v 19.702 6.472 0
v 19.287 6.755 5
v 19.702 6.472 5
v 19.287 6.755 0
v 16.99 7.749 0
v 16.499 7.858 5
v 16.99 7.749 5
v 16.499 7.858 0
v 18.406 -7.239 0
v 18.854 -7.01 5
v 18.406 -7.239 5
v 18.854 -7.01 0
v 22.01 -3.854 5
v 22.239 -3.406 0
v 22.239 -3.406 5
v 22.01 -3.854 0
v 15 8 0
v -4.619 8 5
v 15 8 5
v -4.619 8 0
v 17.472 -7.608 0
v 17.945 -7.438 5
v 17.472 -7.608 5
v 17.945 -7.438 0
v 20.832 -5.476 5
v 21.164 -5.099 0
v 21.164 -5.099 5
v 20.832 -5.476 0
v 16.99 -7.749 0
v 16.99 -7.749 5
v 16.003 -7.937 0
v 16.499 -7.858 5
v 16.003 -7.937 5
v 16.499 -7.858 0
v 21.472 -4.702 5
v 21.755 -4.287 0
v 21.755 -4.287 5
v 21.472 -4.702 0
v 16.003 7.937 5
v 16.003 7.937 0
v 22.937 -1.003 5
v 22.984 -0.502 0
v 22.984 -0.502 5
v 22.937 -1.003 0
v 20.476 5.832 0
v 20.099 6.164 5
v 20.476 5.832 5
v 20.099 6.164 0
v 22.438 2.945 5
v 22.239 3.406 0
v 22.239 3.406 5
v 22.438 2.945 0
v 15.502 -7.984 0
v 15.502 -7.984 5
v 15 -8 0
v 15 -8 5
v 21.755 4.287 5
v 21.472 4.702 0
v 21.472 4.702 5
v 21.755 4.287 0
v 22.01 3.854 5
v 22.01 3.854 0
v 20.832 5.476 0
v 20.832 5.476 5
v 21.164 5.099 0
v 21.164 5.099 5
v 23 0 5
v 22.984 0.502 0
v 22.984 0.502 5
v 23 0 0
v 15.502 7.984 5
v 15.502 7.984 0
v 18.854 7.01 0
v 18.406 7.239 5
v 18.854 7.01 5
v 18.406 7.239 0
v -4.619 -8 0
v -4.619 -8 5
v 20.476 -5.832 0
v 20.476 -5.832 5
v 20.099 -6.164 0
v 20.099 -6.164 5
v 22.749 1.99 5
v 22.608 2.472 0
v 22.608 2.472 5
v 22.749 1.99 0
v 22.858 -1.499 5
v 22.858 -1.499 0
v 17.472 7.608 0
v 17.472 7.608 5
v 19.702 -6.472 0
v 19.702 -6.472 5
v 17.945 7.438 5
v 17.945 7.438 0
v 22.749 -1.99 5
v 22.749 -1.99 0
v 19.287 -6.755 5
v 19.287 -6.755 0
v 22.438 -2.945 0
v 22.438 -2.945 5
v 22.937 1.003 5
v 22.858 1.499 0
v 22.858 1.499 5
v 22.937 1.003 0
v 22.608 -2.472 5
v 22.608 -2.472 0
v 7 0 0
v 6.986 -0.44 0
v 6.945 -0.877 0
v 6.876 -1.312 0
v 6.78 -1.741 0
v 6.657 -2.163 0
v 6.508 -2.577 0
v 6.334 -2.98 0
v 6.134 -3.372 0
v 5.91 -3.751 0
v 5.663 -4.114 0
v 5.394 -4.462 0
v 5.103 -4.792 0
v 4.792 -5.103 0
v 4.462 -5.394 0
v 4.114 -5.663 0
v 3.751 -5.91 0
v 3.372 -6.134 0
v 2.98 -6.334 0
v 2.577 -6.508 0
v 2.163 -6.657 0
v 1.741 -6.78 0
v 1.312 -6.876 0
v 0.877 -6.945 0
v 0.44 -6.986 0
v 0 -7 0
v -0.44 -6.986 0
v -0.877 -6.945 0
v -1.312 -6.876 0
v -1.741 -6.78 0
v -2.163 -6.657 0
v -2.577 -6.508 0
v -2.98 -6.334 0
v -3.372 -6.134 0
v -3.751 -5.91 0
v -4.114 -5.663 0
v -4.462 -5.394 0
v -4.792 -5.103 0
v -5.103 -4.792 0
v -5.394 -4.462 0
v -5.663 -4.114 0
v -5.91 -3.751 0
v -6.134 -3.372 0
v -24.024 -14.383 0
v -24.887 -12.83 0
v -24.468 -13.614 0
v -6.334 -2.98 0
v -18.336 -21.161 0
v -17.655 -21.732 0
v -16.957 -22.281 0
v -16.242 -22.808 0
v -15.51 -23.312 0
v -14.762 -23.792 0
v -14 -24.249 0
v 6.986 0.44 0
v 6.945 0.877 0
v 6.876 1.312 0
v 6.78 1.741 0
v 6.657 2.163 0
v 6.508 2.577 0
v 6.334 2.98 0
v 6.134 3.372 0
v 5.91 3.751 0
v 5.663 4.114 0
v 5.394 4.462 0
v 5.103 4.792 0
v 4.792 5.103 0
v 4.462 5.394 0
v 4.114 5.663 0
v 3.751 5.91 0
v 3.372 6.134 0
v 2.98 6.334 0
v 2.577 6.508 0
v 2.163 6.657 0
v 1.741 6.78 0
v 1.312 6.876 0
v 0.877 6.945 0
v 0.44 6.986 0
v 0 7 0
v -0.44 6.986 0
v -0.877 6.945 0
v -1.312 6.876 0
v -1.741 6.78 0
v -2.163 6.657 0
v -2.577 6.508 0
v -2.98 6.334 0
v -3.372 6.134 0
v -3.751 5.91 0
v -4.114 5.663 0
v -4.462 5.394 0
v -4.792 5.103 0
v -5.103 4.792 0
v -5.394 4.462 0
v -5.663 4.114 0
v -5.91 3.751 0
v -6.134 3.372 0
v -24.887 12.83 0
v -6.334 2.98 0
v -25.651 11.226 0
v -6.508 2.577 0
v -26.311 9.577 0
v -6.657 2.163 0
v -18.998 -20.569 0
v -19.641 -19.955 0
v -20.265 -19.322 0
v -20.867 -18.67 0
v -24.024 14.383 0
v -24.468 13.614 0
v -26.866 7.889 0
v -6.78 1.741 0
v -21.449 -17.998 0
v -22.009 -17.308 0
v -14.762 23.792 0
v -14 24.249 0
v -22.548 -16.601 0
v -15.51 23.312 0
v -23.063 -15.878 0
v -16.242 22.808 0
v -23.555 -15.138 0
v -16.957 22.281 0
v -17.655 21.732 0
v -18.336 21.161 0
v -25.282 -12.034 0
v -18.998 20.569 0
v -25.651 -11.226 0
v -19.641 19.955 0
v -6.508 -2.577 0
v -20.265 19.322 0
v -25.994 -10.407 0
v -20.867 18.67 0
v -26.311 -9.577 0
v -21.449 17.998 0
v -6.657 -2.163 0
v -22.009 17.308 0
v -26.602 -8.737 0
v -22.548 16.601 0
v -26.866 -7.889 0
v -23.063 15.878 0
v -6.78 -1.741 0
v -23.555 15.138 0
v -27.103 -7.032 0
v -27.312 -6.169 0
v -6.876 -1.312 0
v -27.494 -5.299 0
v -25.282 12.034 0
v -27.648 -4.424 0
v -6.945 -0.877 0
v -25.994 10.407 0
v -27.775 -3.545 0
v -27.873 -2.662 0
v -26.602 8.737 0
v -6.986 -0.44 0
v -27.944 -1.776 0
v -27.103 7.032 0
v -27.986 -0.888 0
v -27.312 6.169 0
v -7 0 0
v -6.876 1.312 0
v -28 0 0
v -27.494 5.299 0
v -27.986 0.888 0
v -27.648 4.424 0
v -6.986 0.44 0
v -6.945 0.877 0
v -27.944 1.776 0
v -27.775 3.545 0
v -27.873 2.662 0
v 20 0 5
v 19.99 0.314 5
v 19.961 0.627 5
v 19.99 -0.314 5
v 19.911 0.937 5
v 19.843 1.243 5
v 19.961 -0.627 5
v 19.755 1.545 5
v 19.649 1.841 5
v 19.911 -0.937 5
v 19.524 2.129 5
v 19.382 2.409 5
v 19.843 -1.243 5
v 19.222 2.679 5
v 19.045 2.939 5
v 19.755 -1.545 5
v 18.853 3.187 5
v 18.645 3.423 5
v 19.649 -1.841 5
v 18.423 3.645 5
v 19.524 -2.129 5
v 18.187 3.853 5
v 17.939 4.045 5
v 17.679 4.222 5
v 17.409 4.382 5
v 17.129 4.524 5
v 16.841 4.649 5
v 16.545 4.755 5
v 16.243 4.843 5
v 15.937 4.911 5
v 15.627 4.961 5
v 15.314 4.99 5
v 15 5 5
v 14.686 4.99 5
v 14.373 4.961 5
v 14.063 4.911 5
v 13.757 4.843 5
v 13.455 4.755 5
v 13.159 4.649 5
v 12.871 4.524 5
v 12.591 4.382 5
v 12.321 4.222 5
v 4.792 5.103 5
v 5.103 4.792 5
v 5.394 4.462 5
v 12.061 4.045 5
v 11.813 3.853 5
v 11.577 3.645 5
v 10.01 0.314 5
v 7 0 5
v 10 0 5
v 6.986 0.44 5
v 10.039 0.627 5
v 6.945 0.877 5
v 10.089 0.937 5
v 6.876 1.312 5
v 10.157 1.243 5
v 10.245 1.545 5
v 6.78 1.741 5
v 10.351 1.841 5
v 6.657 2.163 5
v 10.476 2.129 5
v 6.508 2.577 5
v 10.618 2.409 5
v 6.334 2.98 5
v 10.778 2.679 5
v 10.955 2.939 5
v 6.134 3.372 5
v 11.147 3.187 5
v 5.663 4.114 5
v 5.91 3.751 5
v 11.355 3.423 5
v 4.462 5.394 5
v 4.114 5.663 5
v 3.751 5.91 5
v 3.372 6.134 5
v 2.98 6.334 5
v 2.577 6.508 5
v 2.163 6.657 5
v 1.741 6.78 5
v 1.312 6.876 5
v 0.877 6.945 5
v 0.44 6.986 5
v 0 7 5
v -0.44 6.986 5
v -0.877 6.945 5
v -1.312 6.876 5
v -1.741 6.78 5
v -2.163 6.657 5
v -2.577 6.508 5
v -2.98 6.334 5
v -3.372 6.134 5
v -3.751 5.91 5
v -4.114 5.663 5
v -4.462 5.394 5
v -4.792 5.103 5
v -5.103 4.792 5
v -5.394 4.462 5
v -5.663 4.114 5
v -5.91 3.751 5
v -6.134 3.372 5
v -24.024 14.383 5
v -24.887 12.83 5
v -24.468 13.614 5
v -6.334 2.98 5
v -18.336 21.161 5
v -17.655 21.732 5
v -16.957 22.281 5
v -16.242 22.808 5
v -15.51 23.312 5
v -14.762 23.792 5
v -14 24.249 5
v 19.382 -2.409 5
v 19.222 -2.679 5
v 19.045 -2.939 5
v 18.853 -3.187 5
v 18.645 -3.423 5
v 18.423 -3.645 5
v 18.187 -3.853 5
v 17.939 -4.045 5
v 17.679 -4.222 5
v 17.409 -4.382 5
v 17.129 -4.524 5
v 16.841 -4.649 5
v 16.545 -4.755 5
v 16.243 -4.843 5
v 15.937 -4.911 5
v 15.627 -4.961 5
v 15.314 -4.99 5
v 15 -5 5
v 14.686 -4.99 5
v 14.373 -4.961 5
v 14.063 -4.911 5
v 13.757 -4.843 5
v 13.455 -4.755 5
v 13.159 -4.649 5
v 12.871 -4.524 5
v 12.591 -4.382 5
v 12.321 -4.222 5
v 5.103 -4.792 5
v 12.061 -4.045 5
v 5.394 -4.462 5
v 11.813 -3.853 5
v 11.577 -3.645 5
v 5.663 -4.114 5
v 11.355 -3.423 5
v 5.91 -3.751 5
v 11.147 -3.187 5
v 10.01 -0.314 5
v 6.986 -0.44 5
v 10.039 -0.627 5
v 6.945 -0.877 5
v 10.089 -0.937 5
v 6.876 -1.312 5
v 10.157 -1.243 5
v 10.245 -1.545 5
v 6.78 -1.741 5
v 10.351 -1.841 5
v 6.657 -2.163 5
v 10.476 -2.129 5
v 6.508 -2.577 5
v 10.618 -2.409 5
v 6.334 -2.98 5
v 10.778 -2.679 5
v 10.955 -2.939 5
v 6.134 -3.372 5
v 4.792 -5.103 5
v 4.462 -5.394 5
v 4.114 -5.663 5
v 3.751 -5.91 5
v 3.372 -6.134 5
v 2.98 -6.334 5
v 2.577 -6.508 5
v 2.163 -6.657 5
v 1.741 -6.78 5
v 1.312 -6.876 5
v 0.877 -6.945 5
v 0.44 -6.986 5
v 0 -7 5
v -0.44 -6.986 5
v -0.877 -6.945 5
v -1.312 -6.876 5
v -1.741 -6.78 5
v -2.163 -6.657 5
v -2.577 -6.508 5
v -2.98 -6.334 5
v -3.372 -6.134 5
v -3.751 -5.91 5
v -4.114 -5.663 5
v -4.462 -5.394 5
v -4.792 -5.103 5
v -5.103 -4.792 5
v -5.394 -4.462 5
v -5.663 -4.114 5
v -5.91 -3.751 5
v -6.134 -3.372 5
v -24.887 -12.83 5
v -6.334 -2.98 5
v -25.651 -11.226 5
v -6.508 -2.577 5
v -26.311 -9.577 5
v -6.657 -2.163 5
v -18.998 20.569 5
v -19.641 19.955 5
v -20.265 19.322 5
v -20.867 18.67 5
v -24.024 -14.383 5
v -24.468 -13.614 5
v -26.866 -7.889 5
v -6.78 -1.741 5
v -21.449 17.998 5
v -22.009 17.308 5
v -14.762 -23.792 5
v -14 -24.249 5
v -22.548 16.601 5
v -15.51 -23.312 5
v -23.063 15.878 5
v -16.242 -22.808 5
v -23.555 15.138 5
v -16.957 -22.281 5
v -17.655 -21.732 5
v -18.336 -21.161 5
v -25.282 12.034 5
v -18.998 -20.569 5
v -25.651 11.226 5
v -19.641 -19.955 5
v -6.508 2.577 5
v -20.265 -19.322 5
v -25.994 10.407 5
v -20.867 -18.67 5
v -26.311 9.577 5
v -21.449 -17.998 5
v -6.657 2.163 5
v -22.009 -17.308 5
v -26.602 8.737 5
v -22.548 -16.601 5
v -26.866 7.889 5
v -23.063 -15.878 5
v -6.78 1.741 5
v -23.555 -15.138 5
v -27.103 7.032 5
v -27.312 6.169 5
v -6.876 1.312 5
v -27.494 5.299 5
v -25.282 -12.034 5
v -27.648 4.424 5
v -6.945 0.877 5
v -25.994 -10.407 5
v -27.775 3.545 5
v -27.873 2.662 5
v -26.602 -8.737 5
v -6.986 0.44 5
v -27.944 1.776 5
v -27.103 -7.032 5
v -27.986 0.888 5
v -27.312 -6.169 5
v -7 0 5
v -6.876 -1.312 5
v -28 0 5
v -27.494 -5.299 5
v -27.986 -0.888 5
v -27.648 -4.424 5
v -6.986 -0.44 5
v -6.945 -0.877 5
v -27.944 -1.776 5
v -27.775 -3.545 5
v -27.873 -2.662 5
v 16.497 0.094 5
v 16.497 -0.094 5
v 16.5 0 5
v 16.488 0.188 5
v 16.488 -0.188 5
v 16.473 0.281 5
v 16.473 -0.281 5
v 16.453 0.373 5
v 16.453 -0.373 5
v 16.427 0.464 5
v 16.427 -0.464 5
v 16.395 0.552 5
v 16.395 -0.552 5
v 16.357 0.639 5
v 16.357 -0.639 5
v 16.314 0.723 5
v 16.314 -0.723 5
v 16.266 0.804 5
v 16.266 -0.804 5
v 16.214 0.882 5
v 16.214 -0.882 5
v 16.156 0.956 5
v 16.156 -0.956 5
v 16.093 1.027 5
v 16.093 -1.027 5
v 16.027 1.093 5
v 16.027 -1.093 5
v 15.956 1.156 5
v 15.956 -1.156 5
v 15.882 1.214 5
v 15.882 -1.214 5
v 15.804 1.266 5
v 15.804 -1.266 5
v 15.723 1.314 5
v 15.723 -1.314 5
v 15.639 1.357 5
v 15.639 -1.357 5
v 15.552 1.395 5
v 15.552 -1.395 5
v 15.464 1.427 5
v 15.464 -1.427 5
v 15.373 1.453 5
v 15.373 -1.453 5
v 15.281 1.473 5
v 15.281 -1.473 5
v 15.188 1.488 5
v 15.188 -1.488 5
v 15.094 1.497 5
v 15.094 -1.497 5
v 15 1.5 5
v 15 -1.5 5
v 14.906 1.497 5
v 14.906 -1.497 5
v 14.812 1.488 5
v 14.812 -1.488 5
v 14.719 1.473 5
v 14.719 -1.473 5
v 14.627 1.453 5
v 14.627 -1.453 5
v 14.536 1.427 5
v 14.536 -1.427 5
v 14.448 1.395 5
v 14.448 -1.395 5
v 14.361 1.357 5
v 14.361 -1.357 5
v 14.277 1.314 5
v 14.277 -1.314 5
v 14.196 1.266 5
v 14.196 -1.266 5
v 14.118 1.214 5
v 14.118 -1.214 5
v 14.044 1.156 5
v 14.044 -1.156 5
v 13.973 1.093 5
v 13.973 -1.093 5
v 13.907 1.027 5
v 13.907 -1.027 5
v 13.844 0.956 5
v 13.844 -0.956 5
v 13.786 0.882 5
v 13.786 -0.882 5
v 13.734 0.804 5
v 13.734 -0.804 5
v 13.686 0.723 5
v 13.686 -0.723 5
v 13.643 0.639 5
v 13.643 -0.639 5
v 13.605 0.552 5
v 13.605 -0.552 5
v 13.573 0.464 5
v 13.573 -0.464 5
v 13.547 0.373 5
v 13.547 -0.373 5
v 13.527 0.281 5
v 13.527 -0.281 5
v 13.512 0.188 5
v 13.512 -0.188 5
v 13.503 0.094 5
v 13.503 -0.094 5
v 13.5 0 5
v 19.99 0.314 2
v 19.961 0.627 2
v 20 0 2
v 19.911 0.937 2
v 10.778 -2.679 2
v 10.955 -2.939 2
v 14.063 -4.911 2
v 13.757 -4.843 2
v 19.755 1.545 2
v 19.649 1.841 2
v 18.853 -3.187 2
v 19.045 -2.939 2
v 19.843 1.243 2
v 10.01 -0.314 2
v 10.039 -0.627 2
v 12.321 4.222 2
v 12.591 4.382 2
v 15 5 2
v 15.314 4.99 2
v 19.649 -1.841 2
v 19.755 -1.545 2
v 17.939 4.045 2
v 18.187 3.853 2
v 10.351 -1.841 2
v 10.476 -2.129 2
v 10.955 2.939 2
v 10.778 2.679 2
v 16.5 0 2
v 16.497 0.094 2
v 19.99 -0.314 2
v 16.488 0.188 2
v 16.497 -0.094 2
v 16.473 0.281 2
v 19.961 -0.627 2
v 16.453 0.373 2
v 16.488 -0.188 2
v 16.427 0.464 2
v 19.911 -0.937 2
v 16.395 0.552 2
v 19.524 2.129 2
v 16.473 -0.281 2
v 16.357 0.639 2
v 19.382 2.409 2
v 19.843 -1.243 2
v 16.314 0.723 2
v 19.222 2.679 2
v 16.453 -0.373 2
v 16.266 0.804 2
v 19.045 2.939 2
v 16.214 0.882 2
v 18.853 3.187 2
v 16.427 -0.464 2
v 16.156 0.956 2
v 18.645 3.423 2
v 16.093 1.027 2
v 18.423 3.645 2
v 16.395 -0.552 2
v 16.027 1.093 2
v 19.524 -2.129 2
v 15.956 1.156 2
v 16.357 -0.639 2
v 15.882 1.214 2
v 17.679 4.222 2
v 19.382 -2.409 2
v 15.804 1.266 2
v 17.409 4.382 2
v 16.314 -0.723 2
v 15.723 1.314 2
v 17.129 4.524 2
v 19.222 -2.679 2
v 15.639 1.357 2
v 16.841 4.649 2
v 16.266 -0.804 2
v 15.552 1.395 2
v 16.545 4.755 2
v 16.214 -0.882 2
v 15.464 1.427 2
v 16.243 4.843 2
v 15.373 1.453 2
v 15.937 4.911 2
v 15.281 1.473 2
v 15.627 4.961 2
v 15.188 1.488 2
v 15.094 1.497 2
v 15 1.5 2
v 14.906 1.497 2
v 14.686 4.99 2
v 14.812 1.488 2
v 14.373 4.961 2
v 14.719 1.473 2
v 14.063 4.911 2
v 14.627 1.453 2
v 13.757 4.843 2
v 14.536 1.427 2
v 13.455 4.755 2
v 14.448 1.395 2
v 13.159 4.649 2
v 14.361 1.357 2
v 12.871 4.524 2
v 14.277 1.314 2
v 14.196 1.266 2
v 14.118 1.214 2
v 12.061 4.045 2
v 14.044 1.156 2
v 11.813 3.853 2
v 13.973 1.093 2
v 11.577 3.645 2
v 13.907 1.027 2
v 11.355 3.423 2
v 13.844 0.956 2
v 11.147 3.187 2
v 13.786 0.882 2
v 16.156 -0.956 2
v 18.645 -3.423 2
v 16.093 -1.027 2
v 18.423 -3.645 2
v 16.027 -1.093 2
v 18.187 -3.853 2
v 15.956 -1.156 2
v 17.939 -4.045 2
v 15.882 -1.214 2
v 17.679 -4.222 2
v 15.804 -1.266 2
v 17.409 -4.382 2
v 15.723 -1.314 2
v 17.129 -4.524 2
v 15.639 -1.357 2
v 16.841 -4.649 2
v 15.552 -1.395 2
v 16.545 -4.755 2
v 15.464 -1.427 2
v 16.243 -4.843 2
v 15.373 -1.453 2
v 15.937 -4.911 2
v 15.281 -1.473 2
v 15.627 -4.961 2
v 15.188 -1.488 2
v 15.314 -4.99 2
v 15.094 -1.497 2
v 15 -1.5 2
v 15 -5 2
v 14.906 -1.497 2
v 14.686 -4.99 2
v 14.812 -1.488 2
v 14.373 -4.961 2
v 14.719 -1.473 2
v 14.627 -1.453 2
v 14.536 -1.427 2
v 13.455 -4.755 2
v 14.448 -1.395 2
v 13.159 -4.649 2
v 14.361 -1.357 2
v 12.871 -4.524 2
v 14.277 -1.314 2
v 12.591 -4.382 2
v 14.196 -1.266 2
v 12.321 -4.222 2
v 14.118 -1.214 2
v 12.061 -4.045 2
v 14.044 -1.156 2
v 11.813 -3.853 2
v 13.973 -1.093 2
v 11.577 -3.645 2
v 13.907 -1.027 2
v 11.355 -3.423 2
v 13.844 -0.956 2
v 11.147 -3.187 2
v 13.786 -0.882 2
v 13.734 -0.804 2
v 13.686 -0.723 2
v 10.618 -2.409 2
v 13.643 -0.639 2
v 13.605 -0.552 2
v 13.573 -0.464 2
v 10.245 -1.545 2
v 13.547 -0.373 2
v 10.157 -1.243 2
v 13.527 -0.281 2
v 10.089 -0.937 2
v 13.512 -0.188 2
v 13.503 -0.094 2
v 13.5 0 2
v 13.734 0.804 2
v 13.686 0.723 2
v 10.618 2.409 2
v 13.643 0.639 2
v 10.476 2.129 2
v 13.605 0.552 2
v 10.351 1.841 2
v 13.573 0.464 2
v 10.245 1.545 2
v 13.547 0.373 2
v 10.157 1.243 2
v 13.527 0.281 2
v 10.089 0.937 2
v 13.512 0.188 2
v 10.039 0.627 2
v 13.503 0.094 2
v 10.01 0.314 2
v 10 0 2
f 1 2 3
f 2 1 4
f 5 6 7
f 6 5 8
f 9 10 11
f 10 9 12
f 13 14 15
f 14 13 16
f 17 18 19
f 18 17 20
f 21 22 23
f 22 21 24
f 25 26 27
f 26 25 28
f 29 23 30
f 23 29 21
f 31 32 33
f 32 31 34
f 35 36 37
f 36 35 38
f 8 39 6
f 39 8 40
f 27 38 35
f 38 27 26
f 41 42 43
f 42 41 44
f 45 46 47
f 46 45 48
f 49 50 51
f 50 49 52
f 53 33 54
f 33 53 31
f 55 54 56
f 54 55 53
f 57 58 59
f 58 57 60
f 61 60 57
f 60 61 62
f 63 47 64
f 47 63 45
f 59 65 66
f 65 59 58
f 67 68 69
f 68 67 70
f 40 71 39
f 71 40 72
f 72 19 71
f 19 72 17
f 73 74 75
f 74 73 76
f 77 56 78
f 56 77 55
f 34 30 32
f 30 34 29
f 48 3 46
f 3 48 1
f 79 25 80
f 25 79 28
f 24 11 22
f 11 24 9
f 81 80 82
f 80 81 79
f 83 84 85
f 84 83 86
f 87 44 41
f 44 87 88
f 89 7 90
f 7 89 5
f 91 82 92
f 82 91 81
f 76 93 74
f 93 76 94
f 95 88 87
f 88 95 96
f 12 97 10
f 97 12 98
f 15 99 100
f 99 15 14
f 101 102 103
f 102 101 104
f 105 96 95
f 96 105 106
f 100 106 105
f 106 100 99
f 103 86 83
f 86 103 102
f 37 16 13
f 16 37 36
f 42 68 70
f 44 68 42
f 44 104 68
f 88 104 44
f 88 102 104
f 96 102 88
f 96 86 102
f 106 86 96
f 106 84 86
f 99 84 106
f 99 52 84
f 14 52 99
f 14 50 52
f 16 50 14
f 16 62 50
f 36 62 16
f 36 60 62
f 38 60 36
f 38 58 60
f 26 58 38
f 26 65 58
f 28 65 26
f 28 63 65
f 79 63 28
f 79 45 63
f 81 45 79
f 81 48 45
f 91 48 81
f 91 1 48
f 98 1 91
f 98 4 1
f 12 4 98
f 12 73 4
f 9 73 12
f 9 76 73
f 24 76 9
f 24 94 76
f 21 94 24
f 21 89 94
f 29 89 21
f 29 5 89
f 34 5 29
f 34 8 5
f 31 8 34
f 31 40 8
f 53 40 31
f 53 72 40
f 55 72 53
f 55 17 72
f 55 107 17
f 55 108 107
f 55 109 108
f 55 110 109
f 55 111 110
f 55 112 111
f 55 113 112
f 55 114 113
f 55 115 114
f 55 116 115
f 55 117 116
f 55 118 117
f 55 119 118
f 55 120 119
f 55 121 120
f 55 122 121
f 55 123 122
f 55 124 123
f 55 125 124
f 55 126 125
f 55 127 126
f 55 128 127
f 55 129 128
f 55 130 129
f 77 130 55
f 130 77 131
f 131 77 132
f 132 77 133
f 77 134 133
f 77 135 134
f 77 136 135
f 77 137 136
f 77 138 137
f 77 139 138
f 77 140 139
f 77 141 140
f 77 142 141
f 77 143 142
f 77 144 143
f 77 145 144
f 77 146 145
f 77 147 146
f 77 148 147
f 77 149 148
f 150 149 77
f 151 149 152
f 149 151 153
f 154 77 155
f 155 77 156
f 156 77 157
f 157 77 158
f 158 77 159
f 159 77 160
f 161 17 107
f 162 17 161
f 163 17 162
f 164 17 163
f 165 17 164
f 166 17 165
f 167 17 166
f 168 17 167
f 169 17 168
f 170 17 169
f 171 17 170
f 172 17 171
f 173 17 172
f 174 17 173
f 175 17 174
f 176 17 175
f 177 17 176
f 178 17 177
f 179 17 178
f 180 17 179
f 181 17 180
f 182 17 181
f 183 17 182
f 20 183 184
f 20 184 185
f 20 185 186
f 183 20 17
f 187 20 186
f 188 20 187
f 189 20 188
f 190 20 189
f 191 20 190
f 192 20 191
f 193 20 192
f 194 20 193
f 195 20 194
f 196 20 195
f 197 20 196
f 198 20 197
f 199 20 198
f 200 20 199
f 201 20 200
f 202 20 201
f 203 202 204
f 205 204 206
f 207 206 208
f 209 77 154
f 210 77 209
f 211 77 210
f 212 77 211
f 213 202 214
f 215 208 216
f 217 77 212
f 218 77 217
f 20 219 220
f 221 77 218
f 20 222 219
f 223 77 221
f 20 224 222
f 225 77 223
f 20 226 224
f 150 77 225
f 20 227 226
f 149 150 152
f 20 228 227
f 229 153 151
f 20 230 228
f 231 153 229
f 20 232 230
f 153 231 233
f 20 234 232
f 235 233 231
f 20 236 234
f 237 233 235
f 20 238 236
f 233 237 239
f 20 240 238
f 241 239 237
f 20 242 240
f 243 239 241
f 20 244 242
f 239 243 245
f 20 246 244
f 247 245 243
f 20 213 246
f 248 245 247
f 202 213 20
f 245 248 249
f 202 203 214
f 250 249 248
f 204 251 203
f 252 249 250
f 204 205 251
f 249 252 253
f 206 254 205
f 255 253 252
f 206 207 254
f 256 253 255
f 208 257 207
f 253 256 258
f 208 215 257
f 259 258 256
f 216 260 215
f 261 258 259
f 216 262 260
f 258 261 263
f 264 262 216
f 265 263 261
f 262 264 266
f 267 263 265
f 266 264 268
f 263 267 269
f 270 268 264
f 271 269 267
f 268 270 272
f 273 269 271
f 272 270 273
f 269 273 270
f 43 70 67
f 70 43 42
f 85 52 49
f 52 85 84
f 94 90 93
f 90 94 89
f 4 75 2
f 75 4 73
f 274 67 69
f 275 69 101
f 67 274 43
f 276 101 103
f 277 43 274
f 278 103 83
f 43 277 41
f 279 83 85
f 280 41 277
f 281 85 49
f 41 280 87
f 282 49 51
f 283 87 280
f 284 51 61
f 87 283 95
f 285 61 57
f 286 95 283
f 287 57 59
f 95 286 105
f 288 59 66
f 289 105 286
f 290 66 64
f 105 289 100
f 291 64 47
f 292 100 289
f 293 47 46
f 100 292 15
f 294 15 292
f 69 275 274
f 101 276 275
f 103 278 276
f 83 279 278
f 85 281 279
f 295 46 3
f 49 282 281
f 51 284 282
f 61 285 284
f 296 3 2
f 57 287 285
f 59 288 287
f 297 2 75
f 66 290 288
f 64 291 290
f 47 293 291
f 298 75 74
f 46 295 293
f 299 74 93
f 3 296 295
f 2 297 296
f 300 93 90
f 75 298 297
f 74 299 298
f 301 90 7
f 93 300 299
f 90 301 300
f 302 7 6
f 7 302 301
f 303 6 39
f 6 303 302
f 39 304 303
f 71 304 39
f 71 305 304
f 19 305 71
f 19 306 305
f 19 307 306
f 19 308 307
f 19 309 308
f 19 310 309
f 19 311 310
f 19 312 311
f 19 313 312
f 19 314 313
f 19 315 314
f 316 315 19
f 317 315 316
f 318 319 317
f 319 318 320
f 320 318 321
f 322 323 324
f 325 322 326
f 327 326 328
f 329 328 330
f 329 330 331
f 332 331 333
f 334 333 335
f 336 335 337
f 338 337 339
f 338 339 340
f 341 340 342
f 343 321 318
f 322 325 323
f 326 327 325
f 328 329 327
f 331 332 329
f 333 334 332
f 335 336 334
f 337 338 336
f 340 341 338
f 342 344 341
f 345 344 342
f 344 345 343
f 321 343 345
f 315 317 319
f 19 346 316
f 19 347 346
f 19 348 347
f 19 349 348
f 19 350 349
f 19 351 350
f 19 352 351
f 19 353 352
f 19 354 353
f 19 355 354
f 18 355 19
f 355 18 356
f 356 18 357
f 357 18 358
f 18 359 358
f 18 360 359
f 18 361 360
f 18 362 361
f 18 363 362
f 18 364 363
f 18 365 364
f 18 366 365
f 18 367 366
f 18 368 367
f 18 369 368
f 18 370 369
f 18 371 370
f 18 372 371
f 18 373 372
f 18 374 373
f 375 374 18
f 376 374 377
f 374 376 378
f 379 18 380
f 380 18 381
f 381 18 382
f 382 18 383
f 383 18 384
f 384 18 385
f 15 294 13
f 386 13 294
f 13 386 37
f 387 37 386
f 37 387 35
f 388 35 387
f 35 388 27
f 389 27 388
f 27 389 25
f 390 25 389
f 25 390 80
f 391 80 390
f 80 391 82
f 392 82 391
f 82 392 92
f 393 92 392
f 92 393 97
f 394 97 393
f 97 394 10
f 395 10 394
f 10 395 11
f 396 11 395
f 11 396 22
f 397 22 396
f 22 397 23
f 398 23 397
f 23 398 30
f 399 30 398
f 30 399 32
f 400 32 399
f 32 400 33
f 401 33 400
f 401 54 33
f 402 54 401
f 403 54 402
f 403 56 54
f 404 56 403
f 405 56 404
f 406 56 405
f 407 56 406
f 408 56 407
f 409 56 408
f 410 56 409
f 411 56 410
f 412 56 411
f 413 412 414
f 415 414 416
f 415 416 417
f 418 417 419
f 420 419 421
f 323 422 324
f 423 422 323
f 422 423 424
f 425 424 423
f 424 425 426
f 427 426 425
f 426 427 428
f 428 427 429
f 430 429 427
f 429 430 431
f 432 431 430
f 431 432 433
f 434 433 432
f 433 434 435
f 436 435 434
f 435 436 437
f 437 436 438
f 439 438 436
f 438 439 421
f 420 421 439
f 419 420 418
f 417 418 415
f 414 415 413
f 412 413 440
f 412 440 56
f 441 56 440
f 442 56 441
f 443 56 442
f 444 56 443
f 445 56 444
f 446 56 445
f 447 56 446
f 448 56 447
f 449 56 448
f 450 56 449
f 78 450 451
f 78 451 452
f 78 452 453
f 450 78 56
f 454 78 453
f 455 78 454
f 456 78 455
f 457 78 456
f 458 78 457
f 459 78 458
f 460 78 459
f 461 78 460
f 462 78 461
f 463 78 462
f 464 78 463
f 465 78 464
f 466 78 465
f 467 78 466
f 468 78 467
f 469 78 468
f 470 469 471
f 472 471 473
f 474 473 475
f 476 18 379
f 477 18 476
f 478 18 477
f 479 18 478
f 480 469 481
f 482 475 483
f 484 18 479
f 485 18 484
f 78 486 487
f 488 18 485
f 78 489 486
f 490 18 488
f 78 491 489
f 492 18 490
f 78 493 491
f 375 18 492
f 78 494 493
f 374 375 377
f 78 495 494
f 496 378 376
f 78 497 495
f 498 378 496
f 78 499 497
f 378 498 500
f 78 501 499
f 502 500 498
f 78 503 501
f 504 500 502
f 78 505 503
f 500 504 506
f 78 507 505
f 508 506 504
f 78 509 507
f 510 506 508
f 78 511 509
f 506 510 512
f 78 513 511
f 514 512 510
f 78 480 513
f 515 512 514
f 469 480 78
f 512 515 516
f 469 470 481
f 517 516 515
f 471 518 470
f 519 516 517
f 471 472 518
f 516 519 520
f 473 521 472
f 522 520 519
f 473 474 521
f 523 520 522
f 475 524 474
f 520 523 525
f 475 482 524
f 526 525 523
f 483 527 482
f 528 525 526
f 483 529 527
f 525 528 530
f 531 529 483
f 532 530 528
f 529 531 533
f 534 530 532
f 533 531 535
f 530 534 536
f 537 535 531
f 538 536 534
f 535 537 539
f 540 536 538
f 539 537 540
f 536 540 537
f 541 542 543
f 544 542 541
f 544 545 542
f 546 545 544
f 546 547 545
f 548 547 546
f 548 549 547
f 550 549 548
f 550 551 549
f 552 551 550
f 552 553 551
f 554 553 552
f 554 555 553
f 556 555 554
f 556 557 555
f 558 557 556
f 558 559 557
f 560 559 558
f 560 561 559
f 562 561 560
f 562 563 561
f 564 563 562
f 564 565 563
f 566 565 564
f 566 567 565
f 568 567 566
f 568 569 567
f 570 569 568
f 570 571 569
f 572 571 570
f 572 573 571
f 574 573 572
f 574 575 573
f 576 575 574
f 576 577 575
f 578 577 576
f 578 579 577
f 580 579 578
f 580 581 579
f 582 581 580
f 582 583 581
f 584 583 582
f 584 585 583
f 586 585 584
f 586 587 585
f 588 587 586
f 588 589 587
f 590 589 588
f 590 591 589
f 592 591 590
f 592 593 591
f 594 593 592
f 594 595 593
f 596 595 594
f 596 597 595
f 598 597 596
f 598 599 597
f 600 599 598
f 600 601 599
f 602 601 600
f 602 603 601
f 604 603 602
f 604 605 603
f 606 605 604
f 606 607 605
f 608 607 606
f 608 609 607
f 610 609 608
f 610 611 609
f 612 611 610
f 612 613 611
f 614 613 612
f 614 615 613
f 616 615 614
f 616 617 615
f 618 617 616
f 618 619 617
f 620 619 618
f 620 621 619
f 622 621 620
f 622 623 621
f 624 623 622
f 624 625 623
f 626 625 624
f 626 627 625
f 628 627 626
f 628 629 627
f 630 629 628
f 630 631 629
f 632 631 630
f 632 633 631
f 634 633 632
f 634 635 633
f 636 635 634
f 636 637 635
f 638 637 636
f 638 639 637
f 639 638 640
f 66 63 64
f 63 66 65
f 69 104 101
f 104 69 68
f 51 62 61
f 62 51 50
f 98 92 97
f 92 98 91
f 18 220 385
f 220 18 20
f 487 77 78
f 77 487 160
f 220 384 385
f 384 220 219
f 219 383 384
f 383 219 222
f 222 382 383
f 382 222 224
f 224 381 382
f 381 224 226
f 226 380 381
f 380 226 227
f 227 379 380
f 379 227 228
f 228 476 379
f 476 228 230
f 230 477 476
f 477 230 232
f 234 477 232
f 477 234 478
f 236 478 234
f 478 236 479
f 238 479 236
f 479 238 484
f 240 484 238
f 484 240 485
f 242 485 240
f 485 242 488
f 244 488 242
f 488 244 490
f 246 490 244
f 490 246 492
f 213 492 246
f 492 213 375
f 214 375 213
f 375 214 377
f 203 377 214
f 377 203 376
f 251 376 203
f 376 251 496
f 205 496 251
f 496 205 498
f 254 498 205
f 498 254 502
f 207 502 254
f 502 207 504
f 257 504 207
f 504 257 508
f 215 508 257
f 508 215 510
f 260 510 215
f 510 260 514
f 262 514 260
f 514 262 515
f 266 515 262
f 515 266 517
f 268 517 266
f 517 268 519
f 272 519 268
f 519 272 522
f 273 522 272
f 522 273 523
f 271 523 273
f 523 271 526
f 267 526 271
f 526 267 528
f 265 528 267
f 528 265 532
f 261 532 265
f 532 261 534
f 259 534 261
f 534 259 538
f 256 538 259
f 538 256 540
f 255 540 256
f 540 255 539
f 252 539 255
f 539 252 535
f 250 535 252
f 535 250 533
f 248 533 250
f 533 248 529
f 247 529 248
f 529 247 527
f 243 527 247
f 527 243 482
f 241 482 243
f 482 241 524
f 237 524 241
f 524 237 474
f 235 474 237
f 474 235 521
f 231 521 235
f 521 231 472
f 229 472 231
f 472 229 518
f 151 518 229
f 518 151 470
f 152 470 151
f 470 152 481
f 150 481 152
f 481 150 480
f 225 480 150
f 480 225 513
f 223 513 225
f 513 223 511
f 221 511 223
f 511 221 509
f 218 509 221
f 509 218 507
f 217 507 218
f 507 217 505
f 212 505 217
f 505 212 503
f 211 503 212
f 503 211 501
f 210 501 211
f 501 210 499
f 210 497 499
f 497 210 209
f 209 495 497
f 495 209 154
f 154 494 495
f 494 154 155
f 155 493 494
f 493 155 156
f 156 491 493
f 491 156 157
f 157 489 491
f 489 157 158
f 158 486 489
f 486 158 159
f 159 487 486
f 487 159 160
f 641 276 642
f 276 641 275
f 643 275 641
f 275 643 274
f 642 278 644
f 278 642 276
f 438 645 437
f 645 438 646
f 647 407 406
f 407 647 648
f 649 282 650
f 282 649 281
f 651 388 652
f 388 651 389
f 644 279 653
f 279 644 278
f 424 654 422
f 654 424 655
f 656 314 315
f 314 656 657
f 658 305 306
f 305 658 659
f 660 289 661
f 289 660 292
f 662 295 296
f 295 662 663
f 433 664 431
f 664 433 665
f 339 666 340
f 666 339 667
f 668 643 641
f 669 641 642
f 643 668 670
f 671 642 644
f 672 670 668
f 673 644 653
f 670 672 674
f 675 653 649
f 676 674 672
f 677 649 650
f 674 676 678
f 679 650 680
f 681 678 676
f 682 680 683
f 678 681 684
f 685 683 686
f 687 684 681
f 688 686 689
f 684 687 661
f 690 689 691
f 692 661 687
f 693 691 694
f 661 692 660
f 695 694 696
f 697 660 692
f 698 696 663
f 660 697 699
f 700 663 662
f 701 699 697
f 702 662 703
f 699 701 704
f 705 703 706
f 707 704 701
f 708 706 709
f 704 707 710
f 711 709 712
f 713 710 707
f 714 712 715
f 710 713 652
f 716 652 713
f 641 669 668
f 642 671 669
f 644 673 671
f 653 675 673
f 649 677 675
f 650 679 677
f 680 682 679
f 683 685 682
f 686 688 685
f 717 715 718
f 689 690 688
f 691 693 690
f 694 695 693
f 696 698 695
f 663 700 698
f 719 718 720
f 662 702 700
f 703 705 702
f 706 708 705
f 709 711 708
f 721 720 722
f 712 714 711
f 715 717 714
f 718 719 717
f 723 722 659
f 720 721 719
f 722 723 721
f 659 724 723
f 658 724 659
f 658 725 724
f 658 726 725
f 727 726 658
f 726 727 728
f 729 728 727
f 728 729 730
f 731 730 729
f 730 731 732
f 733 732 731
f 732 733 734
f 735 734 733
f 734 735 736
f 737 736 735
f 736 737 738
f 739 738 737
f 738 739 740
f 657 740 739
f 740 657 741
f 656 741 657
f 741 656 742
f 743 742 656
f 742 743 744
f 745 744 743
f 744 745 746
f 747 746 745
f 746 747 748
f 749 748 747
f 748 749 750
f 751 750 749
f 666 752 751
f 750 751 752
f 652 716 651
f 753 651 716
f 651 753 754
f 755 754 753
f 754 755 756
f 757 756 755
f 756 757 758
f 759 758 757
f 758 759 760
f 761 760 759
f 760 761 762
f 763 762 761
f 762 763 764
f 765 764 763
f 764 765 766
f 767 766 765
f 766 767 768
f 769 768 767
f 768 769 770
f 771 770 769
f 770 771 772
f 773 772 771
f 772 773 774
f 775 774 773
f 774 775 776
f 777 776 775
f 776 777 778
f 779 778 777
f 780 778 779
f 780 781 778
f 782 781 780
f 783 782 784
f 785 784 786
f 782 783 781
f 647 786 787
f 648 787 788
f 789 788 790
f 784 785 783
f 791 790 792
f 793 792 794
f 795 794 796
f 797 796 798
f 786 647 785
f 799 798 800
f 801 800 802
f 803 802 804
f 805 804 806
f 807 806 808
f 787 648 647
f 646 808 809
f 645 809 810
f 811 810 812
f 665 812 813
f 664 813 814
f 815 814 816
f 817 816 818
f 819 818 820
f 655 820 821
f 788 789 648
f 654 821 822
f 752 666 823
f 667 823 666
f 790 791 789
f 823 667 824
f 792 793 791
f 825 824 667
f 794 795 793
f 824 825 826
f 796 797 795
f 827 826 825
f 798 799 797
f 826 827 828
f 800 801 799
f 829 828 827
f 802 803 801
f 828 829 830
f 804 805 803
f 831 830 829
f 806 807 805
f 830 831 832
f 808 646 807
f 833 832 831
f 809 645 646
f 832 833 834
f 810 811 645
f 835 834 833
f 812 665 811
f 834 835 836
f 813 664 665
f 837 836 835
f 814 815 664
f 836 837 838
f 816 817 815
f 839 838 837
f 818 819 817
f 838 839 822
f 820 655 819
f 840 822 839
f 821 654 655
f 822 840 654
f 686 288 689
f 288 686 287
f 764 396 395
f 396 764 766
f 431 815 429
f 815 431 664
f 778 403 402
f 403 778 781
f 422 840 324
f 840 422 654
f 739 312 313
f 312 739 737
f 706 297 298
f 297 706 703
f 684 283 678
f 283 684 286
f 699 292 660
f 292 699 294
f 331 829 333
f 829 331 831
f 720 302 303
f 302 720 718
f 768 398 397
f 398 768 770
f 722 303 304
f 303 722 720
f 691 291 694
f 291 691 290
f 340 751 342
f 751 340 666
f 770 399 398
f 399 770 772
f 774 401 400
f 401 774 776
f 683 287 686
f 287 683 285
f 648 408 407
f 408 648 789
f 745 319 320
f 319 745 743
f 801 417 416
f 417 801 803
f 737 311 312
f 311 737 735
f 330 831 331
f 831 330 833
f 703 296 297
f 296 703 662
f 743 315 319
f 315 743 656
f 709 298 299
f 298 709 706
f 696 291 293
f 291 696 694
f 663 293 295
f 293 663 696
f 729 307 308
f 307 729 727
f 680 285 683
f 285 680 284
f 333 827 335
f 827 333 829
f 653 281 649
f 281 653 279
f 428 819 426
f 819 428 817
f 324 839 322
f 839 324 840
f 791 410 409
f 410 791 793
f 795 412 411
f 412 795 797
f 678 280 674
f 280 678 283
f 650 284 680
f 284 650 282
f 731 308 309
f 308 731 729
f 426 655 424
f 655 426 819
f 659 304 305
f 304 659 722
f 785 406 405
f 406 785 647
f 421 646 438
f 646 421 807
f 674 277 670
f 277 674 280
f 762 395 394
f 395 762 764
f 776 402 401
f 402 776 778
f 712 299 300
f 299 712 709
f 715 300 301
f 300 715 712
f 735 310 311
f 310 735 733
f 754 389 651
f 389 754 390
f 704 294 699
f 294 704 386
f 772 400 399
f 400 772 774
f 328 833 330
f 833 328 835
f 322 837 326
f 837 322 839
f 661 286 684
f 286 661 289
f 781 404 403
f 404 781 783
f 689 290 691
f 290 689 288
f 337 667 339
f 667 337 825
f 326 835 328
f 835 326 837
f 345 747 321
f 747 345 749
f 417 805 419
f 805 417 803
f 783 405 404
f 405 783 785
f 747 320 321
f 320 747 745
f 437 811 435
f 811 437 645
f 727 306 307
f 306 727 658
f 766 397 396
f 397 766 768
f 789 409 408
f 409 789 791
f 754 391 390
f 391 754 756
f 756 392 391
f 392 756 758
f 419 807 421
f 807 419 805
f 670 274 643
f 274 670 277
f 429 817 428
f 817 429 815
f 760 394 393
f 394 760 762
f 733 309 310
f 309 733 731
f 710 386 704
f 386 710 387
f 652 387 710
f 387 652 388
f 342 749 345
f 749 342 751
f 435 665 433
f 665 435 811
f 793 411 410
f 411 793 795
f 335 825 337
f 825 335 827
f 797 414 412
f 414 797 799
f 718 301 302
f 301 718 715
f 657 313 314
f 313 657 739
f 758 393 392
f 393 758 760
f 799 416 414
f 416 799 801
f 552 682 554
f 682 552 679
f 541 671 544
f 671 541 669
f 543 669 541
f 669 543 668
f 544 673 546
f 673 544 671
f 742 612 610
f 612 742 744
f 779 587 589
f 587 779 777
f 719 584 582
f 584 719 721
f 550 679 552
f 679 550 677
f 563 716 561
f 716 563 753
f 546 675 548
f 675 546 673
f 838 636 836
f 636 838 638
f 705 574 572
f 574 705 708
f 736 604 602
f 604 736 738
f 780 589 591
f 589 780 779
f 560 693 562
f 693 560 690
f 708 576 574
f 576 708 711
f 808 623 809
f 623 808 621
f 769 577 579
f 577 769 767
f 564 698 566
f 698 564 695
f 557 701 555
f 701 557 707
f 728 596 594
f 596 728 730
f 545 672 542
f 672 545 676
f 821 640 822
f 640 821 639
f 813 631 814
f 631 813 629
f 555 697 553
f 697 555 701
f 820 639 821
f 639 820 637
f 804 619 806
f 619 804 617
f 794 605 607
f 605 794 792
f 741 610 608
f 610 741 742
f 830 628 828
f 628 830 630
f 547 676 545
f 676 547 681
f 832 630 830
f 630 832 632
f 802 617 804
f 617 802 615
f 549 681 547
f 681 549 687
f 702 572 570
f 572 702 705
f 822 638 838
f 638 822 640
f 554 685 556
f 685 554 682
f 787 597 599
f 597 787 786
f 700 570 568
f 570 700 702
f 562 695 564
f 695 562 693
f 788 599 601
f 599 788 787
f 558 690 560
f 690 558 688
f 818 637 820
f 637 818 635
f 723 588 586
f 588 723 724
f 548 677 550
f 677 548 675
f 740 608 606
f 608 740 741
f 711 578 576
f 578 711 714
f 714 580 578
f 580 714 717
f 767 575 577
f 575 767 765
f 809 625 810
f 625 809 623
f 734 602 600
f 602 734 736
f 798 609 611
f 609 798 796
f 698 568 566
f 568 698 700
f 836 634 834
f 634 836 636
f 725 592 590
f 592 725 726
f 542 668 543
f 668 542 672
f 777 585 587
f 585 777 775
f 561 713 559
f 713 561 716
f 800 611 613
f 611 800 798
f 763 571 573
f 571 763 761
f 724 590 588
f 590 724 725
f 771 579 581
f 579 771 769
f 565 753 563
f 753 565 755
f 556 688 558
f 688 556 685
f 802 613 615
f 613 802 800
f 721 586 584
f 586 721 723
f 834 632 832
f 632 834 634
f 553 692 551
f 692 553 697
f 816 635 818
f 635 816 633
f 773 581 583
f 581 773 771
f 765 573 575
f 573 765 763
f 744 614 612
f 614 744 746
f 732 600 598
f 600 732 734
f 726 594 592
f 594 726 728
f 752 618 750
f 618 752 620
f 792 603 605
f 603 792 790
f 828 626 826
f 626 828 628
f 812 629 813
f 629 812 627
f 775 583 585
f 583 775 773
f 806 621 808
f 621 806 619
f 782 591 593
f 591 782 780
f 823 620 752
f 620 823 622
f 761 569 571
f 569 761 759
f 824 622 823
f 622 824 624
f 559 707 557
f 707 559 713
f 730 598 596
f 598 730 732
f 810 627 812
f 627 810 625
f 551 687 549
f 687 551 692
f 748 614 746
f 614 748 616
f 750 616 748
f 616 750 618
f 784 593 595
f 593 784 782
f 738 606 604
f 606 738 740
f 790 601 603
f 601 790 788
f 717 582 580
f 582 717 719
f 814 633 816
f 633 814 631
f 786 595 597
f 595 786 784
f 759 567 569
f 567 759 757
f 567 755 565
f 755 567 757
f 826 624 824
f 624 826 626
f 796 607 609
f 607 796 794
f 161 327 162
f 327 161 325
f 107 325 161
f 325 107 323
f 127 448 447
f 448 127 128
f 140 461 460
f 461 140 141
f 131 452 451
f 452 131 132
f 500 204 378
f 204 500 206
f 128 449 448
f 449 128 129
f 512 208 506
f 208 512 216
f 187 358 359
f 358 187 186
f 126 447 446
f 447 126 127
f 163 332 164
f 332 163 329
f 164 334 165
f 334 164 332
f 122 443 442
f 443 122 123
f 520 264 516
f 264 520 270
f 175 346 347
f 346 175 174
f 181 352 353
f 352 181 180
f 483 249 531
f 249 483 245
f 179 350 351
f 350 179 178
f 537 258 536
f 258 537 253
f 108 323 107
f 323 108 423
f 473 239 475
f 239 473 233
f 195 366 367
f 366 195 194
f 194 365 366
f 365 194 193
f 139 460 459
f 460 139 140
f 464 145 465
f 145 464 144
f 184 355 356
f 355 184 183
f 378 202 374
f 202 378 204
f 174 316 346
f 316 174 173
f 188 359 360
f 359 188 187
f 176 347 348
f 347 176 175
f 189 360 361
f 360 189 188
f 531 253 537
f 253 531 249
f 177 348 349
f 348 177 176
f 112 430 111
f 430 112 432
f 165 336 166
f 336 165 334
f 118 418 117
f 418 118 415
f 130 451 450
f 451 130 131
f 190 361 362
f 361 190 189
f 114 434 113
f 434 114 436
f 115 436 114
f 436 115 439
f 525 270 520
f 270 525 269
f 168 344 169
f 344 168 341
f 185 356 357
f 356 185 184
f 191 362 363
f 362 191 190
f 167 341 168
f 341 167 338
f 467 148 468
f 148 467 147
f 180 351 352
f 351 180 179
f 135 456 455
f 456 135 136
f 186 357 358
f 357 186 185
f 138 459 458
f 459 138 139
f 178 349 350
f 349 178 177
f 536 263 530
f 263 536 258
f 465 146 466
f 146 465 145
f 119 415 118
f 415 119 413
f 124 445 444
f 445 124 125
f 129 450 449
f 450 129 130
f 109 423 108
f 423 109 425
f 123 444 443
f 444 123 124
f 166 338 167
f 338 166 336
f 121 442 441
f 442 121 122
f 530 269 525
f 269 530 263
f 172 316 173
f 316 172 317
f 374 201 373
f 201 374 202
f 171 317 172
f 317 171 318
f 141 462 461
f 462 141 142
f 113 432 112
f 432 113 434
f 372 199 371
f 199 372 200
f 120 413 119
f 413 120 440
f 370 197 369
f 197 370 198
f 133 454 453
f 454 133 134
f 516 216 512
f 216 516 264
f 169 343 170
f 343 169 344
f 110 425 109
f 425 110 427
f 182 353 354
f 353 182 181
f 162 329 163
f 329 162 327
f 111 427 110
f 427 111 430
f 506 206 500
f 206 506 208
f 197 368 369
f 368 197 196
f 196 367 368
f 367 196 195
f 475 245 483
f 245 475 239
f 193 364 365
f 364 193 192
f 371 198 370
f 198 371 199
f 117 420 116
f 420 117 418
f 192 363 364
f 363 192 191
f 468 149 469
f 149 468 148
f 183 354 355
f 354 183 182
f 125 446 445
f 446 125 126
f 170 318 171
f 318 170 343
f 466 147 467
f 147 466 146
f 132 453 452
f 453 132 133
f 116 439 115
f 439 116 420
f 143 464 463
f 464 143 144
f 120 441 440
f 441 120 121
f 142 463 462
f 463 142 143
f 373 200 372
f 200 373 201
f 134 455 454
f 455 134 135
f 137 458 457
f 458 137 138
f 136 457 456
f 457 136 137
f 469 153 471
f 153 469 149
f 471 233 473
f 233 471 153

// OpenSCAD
// CORPS ====================
longueur_totale = 28;
diametre_interieur = 11;
epaisseur_corps = 3;
profondeur_clavette = 3;
diametre_clavette = 3;
diametre_exterieur = diametre_interieur + epaisseur_corps;

// PORTE-CIBLE===============
// Position
hauteur_HT_cible = 21; // à partir de la base
angle_clavette_cible = -130; // en degrés
rayon_centre_cible = 15;
enfoncement_cible = 1;
// Geométrie
diametre_cible = 10;
diametre_cible_interieur = 3;
epaisseur_cible = 2;
epaisseur_cible_pleine = 1;
ratio_cible = 0.7;
// Equilibrage
epaisseur_porte_cible = 2;
rayon_centre_contrepoids = 8;
angle_masse_contrepoids = 120;
profondeur_contrepoids = 20;
diametre_support_contrepoids = diametre_exterieur + epaisseur_porte_cible;
r_int_contrepoids = (rayon_centre_contrepoids - profondeur_contrepoids)/2;
// =========================

// EQUILIBRAGE TOURNANT
PLAQUE_EN_0();
//CIBLE_EN_0();

// DESSIN ======================================
//CORPS();
//PLAQUE();
//CIBLE();

module clavette(){
    rotate([0,90,0]) hull() {
        cylinder(h = diametre_exterieur / 2, d = diametre_clavette, center = false, $fn=100);
        translate([-profondeur_clavette,0,0]) cylinder(h = diametre_exterieur / 2, d = diametre_clavette, center = false, $fn=100);
    }
}

module corps() {
    difference() {
        cylinder(h = longueur_totale, d = diametre_exterieur, center = false, $fn = 100);
        cylinder(h = longueur_totale, d = diametre_interieur, center = false, $fn = 100);
        clavette();
    }
}
module contrepoids(){ // origine sur l'axe de rotation
    
    //rotate_extrude(angle = angle_masse_contrepoids, convexity = 2)
    rotate([0,0,-angle_masse_contrepoids/2])
    rotate_extrude2(angle = angle_masse_contrepoids, convexity = 10, size = 1000)
    translate([rayon_centre_contrepoids,0,0])
        square([profondeur_contrepoids,epaisseur_porte_cible + epaisseur_cible + enfoncement_cible],center = false);
}

module plaque(){
    difference(){ 
            union(){
                    hull(){
                        cylinder(h = epaisseur_porte_cible + epaisseur_cible + enfoncement_cible, d = diametre_exterieur + epaisseur_porte_cible, center = false, $fn = 100);
                        translate([rayon_centre_cible,0,0])
                            cylinder(h = epaisseur_porte_cible + epaisseur_cible + enfoncement_cible, d = diametre_exterieur + epaisseur_porte_cible, center = false, $fn = 100);
                    }
                    hull(){ //hull entre anneau central et corps du contre-poids
                        cylinder(h = epaisseur_porte_cible + epaisseur_cible + enfoncement_cible, d = diametre_exterieur + epaisseur_porte_cible, center = false, $fn = 100);
                        translate([-rayon_centre_contrepoids,0,0]) //Depuis le centre du contre-poids
                            cylinder(h = epaisseur_porte_cible + epaisseur_cible + enfoncement_cible, d = diametre_support_contrepoids, center = false, $fn = 100);
                    }
                    rotate([0,0,180])
                        contrepoids();
                }
            //translate([rayon_centre_cible,0, epaisseur_porte_cible ]) cible();
            translate([rayon_centre_cible,0, epaisseur_porte_cible]) 
                difference(){
                    cylinder(h = enfoncement_cible + epaisseur_cible, d = diametre_cible, center = false, $fn = 100);
                    cylinder(h = enfoncement_cible + epaisseur_cible, d = diametre_cible_interieur, center = false, $fn = 100);
                }
    }
}

module plaque_percee(){
    difference() {
        plaque(); //percer la plaque
        cylinder(h = longueur_totale, d = diametre_exterieur, center = false, $fn = 100);
    }
}
module rotate_extrude2(angle=360, convexity=2, size=1000) { // HELPER

  module angle_cut(angle=90,size=1000) {
    x = size*cos(angle/2);
    y = size*sin(angle/2);
    translate([0,0,-size]) 
      linear_extrude(2*size) polygon([[0,0],[x,y],[x,size],[-size,size],[-size,-size],[x,-size],[x,-y]]);
  }

  // support for angle parameter in rotate_extrude was added after release 2015.03 
  // Thingiverse customizer is still on 2015.03
  angleSupport = (version_num() > 20150399) ? true : false; // Next openscad releases after 2015.03.xx will have support angle parameter
  // Using angle parameter when possible provides huge speed boost, avoids a difference operation

  if (angleSupport) {
    rotate_extrude(angle=angle,convexity=convexity, $fn=200)
      children();
  } else {
    rotate([0,0,angle/2]) difference() {
      rotate_extrude(convexity=convexity, $fn=600) children();
      angle_cut(angle, size);
    }
  }
}
module cible(){
                difference(){ // Percer le centre de l'aimant
                    cylinder(h = epaisseur_cible, d = diametre_cible, center = false, $fn = 100);
                    cylinder(h = epaisseur_cible_pleine, d = diametre_cible_interieur, center = false, $fn = 100);
                    translate([0,0,epaisseur_cible_pleine]) cylinder(h = epaisseur_cible - epaisseur_cible_pleine, d1 = diametre_cible_interieur, d2 = diametre_cible_interieur + (diametre_cible - diametre_cible_interieur) * ratio_cible, center = false, $fn = 100);
                }
}


// POSITIONNEMENT
module CORPS(){ // Dessin et positionnement
    color("blue") corps();
}

module PLAQUE(){ // Dessin et positionnement
    translate([0,0,hauteur_HT_cible]) rotate([0,0,angle_clavette_cible])
    color("cyan") plaque_percee();
}

module CIBLE(){ // Dessin et positionnement
    rotate([0,0,angle_clavette_cible]) 
    translate([rayon_centre_cible, 0, epaisseur_porte_cible])
    translate([0,0, hauteur_HT_cible])
    color("red") cible();   
}

// EQUILIBRAGE
module PLAQUE_EN_0(){
    color("yellow") plaque_percee();
}

module CIBLE_EN_0(){
    //rotate([0,0,angle_clavette_cible]) 
    translate([rayon_centre_cible, 0, epaisseur_porte_cible])
    //translate([0,0, hauteur_HT_cible])
    color("pink") cible();
}
